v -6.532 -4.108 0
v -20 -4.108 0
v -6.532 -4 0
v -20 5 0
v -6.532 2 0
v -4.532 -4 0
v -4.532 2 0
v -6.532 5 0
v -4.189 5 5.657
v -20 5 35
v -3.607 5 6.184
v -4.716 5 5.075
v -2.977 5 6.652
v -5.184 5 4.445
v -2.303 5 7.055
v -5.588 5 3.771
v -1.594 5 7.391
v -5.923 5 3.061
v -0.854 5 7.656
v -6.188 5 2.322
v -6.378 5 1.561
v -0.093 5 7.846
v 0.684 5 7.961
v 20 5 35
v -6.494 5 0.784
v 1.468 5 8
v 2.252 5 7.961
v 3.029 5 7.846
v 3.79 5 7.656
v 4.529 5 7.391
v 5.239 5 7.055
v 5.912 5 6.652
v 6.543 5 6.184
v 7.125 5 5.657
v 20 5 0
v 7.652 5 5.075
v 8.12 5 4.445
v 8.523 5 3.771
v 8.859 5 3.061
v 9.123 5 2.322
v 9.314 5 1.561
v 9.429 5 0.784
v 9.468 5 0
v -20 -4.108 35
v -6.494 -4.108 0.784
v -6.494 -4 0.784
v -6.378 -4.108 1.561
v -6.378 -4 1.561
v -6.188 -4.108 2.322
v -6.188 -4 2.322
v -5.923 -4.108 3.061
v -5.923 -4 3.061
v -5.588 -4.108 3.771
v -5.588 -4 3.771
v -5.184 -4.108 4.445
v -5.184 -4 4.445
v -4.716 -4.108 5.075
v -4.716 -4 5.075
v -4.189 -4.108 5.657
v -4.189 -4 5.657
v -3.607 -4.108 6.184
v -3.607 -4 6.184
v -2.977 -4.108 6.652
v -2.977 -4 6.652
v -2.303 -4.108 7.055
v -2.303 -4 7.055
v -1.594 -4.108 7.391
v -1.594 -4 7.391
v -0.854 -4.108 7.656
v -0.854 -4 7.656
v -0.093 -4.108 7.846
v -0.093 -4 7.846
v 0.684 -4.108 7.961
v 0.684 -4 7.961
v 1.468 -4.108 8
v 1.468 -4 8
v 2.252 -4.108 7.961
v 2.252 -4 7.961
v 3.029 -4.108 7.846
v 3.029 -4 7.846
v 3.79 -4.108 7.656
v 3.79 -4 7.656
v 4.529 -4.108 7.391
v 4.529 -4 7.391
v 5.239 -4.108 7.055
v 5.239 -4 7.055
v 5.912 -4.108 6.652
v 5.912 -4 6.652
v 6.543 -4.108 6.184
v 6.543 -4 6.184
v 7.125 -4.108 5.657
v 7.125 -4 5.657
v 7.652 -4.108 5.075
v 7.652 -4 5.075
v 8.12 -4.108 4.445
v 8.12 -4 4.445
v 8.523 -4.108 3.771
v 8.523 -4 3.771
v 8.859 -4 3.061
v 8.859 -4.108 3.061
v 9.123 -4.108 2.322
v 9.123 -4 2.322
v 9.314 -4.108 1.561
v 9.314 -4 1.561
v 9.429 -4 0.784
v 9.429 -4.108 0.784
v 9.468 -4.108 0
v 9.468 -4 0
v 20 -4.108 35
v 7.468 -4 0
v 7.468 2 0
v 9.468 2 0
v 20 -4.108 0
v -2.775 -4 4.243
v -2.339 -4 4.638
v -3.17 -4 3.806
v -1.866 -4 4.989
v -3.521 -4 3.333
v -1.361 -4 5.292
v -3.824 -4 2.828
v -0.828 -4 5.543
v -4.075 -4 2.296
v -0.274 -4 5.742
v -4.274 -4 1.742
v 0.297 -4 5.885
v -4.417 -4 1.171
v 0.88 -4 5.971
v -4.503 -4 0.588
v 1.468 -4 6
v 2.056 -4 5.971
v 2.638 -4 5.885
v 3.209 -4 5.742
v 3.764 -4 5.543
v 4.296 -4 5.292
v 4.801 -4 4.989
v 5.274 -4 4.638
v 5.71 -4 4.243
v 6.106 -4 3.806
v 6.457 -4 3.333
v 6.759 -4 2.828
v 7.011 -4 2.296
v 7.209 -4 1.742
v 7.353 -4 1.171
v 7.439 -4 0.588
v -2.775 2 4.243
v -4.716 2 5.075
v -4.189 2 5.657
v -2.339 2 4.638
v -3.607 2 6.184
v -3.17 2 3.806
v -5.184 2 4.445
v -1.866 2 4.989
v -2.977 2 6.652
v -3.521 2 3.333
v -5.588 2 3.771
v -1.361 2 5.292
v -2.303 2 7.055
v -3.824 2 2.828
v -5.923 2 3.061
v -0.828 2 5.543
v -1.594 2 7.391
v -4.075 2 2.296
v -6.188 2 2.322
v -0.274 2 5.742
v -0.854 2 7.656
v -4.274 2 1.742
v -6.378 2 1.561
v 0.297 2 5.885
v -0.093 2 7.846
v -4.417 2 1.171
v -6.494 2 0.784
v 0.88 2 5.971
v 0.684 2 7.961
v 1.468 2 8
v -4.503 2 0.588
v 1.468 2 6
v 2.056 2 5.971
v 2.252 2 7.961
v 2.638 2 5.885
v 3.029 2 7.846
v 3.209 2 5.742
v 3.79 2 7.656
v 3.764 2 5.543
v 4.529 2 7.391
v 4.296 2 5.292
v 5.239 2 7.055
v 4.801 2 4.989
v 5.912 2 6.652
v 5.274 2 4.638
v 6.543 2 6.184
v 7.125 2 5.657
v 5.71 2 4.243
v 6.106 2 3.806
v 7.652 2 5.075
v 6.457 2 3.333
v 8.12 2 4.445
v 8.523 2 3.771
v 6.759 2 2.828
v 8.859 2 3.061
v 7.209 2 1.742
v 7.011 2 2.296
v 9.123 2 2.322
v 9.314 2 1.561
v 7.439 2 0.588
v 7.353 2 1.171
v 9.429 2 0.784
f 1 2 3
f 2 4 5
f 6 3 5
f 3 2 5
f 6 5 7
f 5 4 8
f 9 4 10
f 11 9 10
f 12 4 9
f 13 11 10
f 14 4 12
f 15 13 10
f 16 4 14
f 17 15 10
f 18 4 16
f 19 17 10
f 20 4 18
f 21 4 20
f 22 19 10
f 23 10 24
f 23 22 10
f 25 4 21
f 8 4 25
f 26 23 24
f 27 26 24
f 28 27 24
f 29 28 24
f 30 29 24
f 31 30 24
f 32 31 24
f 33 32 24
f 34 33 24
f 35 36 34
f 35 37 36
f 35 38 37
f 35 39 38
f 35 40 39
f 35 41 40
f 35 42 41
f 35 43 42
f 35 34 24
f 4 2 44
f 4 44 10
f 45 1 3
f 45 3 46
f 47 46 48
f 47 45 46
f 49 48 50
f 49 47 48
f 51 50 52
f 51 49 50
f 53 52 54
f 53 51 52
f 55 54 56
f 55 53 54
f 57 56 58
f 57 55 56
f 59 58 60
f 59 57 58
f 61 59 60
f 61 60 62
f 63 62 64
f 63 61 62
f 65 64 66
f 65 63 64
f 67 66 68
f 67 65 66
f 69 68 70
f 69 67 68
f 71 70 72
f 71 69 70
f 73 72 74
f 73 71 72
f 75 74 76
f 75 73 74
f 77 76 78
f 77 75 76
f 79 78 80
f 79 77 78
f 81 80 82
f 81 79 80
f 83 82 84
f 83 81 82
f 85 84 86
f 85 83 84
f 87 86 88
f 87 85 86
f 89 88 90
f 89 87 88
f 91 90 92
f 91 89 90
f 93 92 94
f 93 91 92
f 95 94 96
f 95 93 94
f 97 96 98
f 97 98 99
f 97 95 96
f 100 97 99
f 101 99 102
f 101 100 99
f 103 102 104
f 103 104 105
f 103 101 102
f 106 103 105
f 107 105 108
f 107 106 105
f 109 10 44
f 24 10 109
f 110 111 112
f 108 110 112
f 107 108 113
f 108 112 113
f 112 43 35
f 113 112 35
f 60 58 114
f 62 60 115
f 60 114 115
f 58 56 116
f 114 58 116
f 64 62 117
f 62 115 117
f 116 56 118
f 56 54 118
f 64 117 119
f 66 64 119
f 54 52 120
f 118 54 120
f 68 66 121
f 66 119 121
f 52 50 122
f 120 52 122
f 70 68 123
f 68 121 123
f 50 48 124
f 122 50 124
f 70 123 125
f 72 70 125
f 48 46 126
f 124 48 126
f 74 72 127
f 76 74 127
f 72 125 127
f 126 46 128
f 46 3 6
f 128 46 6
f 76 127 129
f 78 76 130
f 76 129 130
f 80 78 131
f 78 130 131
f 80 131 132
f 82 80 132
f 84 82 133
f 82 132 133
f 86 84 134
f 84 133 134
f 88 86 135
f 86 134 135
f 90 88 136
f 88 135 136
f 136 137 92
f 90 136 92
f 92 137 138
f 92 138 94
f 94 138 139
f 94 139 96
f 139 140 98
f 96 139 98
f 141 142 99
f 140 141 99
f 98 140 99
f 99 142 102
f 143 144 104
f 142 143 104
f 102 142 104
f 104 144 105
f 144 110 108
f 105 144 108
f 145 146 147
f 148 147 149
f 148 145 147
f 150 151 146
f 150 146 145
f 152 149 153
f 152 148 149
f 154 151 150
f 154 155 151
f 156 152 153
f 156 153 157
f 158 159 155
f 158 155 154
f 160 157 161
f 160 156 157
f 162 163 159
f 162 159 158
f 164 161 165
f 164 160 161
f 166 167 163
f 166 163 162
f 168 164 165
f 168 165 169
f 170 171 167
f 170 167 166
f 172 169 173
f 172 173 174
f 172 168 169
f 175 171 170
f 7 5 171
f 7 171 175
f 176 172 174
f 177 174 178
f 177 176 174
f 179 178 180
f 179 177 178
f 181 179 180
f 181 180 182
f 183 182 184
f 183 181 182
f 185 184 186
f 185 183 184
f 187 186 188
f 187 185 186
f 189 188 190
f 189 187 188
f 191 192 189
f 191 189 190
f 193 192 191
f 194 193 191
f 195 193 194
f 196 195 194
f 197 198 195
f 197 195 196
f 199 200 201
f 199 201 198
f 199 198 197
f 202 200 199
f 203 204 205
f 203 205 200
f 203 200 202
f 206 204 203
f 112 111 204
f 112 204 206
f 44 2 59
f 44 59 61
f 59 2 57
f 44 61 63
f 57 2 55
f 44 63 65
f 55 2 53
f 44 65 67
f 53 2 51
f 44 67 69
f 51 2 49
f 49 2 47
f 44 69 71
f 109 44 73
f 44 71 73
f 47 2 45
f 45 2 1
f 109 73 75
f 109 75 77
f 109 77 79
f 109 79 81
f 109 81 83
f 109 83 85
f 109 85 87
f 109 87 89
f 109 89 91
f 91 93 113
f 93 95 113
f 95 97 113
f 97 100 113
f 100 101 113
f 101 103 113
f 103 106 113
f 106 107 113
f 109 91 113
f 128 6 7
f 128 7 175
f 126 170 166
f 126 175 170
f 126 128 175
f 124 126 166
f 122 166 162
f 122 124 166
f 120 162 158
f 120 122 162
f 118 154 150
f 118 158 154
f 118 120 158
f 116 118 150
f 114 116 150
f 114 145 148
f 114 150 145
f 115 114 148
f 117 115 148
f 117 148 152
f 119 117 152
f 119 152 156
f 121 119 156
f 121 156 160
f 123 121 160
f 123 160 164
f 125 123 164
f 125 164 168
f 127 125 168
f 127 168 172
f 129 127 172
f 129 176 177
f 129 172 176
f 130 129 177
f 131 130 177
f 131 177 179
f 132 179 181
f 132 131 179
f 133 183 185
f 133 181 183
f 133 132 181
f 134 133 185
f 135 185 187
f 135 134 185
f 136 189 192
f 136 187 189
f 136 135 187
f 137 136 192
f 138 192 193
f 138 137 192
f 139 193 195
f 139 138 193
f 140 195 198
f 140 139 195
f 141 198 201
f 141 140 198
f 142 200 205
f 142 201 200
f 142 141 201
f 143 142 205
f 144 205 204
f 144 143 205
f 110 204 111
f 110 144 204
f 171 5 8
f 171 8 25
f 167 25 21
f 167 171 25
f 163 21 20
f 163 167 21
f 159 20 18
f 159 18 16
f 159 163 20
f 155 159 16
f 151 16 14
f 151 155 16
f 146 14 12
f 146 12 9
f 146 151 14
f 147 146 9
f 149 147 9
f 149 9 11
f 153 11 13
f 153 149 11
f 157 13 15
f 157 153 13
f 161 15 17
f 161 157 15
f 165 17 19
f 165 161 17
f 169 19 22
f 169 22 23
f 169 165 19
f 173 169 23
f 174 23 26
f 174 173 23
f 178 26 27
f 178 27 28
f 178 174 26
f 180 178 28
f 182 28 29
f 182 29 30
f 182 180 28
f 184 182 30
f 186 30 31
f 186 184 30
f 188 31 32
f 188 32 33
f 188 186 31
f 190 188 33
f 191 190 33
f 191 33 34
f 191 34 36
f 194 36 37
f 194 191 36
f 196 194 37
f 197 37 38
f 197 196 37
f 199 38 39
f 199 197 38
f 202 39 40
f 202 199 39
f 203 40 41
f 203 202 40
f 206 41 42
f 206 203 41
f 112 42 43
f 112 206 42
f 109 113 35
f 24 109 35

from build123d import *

# Parameters (mm, degrees)
SKETCH1_W           = 40
SKETCH1_H           = 9.108063915
BOSS_EXTRUDE1_DEPTH = 35
CAVITY1_START       = -4.108063915
CAVITY1_DEPTH       = 9.108063915
CAVITY1_START_2     = 2
CAVITY1_2_DEPTH     = 3
CAVITY1_3_DEPTH     = 0.108063915


# Read off the part's stored shape, not the designer's step: Cavity1
with BuildPart() as part:
    # Sketch1 → Boss-Extrude1 (new body)
    with BuildSketch(Plane.XY):
        with Locations((0, 0.445968042)):
            Rectangle(SKETCH1_W, SKETCH1_H)
    extrude(amount=BOSS_EXTRUDE1_DEPTH)

    # Cavity1 outline → Cavity1 (cut)
    with BuildSketch(Plane(origin=(0, 0, 0), x_dir=(1, 0, 0), z_dir=(0, 1, 0)).offset(CAVITY1_START)):
        with BuildLine():
            ThreePointArc((-4.532210811, 0), (1.467789189, -6), (7.467789189, 0))
            Line((7.467789189, 0), (-4.532210811, 0))
        make_face()
    extrude(amount=CAVITY1_DEPTH, mode=Mode.SUBTRACT)

    # Cavity1 2 outline → Cavity1 2 (cut)
    with BuildSketch(Plane(origin=(0, 0, 0), x_dir=(1, 0, 0), z_dir=(0, 1, 0)).offset(CAVITY1_START_2)):
        with BuildLine():
            ThreePointArc((-6.532210811, 0), (1.467789189, -8), (9.467789189, 0))
            Line((9.467789189, 0), (7.467789189, 0))
            ThreePointArc((7.467789189, 0), (1.467789189, -6), (-4.532210811, 0))
            Line((-4.532210811, 0), (-6.532210811, 0))
        make_face()
    extrude(amount=CAVITY1_2_DEPTH, mode=Mode.SUBTRACT)

    # Cavity1 3 outline → Cavity1 3 (cut)
    with BuildSketch(Plane(origin=(0, 0, 0), x_dir=(1, 0, 0), z_dir=(0, 1, 0)).offset(CAVITY1_START)):
        with BuildLine():
            ThreePointArc((-6.532210811, 0), (1.467789189, -8), (9.467789189, 0))
            Line((9.467789189, 0), (7.467789189, 0))
            ThreePointArc((7.467789189, 0), (1.467789189, -6), (-4.532210811, 0))
            Line((-4.532210811, 0), (-6.532210811, 0))
        make_face()
    extrude(amount=CAVITY1_3_DEPTH, mode=Mode.SUBTRACT)


solid = part.part
